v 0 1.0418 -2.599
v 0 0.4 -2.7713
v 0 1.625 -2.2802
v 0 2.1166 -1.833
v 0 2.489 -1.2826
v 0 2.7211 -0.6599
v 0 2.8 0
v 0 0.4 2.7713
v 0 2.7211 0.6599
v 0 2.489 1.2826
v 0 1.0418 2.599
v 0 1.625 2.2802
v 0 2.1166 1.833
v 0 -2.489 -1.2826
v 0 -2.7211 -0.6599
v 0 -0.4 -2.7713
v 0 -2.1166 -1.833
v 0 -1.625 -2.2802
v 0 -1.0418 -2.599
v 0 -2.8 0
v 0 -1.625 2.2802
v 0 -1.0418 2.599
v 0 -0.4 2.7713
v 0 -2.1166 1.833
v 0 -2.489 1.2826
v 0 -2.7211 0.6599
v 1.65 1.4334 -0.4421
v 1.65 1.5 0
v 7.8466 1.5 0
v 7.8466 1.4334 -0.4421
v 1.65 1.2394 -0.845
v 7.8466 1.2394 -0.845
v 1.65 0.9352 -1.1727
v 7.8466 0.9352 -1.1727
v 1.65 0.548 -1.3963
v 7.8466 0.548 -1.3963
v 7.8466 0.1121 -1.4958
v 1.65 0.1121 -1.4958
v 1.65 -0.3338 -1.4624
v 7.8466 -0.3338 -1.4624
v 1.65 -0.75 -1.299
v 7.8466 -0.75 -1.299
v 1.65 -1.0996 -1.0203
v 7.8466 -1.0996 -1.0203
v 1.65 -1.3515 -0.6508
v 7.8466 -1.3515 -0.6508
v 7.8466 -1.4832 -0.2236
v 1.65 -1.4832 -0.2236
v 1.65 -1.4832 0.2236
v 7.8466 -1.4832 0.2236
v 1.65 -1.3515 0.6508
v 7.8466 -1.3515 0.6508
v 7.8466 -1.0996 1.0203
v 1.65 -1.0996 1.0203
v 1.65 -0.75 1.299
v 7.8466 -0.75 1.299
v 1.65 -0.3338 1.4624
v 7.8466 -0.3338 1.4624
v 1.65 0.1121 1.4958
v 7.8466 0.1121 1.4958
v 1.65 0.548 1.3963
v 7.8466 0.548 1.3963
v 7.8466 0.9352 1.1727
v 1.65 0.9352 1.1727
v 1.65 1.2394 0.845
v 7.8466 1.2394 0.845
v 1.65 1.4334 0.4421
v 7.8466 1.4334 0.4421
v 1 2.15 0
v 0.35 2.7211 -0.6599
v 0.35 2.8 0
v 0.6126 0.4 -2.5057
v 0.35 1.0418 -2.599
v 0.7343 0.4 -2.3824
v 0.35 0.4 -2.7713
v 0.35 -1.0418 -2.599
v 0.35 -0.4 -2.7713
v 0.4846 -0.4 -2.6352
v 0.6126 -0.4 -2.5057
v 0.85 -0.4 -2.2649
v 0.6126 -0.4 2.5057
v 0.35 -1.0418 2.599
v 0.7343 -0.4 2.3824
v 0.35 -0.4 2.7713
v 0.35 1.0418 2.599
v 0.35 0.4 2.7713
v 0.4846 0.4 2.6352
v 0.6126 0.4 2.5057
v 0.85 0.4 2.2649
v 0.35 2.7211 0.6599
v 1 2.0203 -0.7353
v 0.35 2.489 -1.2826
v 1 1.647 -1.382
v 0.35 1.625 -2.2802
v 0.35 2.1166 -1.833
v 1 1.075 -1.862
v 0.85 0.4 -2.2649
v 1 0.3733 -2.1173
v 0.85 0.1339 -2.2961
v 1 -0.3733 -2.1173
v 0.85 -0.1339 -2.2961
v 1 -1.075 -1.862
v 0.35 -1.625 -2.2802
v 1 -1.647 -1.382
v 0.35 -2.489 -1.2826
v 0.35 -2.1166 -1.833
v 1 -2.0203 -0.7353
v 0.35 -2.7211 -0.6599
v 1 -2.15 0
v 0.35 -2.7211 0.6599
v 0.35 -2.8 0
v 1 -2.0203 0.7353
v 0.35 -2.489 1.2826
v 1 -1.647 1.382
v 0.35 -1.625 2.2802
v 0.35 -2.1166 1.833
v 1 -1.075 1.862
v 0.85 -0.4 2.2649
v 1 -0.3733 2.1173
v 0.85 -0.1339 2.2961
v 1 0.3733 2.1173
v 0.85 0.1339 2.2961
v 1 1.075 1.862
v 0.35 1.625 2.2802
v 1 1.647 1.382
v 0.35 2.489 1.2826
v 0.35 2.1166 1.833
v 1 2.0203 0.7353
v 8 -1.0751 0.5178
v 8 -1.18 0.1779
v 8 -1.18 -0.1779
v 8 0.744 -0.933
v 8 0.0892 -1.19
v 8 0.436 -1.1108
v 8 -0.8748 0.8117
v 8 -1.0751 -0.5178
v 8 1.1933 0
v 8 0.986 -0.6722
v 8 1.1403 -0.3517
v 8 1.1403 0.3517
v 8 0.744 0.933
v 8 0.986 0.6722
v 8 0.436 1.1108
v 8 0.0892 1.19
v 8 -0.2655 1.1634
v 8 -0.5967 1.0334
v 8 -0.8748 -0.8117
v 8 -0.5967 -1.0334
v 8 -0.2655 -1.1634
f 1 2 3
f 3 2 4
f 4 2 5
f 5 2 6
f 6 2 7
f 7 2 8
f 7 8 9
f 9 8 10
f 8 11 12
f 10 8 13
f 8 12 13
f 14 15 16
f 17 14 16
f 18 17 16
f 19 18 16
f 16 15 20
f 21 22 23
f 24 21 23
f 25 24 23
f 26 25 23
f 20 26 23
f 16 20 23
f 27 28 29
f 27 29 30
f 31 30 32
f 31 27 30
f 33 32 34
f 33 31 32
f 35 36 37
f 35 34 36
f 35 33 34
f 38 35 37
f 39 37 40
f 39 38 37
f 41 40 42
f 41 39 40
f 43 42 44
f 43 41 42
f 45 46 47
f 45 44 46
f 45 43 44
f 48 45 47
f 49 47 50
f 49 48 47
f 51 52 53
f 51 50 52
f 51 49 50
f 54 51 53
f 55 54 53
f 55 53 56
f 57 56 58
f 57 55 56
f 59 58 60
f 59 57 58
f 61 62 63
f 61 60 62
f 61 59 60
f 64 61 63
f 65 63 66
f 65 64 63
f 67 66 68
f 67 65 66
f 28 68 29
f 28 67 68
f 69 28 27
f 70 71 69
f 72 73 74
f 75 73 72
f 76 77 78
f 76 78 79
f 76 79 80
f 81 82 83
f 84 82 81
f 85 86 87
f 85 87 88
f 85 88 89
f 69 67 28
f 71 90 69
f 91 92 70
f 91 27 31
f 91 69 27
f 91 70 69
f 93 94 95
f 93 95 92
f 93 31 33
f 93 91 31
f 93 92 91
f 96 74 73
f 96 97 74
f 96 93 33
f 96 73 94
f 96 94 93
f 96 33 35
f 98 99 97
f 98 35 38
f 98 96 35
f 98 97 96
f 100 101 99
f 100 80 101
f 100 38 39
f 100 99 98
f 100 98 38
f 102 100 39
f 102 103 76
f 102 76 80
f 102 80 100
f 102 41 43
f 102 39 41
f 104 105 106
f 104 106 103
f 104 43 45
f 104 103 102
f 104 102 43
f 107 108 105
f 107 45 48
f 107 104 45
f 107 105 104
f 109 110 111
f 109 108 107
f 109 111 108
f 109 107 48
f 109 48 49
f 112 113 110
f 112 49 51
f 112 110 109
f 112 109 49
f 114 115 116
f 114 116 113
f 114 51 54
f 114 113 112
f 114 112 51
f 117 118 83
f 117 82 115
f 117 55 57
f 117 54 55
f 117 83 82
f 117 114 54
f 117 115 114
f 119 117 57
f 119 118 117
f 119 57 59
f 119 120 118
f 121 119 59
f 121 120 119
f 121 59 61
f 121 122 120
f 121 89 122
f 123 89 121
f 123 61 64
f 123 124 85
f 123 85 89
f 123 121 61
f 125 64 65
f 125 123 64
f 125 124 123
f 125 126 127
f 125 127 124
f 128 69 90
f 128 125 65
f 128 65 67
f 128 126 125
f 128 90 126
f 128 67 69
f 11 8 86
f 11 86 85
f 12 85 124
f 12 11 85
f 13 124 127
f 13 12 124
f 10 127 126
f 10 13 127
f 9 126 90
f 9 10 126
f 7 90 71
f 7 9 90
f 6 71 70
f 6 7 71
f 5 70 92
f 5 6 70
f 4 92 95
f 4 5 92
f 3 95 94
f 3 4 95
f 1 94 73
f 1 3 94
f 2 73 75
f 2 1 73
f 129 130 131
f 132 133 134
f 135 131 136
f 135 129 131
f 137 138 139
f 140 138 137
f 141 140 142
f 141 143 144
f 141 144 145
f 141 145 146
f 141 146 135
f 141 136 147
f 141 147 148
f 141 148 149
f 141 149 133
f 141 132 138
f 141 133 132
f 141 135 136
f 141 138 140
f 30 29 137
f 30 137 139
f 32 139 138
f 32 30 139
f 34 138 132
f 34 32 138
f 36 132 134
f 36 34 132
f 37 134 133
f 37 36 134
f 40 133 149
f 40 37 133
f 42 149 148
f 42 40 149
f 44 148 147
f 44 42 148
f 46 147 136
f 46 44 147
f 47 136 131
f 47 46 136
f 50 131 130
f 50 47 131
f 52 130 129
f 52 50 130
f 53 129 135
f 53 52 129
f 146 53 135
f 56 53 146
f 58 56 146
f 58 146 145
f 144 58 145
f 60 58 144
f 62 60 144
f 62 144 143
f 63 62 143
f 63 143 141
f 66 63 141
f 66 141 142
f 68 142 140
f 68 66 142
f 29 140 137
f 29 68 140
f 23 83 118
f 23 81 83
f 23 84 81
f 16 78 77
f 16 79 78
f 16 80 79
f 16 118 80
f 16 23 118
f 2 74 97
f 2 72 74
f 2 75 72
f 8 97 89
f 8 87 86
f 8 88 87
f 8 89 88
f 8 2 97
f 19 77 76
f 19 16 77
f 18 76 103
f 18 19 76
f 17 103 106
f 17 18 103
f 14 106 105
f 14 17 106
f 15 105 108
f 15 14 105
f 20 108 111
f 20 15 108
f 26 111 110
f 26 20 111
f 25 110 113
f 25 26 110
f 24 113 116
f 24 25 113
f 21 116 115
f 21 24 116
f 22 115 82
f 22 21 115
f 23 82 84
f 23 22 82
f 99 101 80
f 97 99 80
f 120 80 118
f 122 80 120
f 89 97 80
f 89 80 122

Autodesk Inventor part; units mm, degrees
ref_plane "YZ Plane" through (0, 0, 0) normal (1, 0, 0) x (0, 1, 0)
ref_plane "XZ Plane" through (0, 0, 0) normal (0, 1, 0) x (-1, 0, 0)
sketch "Esquisse1" plane through (0, 0, 0) normal (0, 0, 1) x (1, 0, 0)
  line L0 (0, 0) -> (8, 0)
  line L1 (8, 0) -> (8, 1.5)
  line L2 (8, 1.5) -> (2.65, 1.5)
  line L3 (2.65, 1.5) -> (2.3433, 1.5)
  line L4 (2.3433, 1.5) -> (1.65, 1.5)
  line L5 (1.65, 1.5) -> (0.35, 2.8)
  line L6 (0.35, 2.8) -> (0, 2.8)
  line L7 (0, 2.8) -> (0, 0)
  line L8 (2.65, 1.5) -> (1.65, 1.5) construction
  line L9 (-1.6, 0) -> (9.6, 0) projected
  line L10 (0, 3.36) -> (0, -0.56) projected
  dimension "d0" = 8
  dimension "d1" = 45
  dimension "d2" = 0.3067
  dimension "d3" = 5.35
  dimension "d4" = 1.65
  dimension "d5" = 3
  dimension "d6" = 3
  dimension "d7" = 5.6
revolve "Corps" add sketch "Esquisse1" angle 360 about axis through (0, 0, 0) along (1, 0, 0)
sketch "Esquisse2" plane through (0, 0, 0) normal (-1, 0, 0) x (0, 0, 1)
  line L0 (2.8, -0.4) -> (-2.8, -0.4)
  line L1 (-2.8, -0.4) -> (-2.8, 0.4)
  line L2 (-2.8, 0.4) -> (2.8, 0.4)
  line L3 (2.8, 0.4) -> (2.8, -0.4)
  line L4 (0, 0.4) -> (0, -0.4) construction
  line L5 (-2.8, 0) -> (2.8, 0) construction
  line L6 (0, 2.8) -> (0, 0) projected
  dimension "d15" = 0.8
  dimension "d16" = 5.6
extrude "Rainure" cut sketch "Esquisse2" against normal blind 0.85
thread "Filetage" size "M3x0.5" class "6g" standard "ISO Metric profile" length 5.35
chamfer "Chanfrein1" distance 0.3067 distance2 0.1534 1 edges at (8, -1.5, 0) measured on face at (8, 0.263, 0.1197)
ref_plane "Work Plane1" through (33.575, 0, 0) normal (0, 0, -1) x (1, 0, 0)
equation "\"d0\" = NLG"
equation "\"d1\" = 0.5 * SEWI"
equation "\"d2\" = GAL"
equation "\"d3\" = GEL"
equation "\"d4\" = KOH"
equation "\"d5\" = BDM"
equation "\"d6\" = GD"
equation "\"d7\" = KOD"
equation "\"d15\" = SBR"
equation "\"d16\" = KOD"
equation "\"d8\" = STI"
equation "\"d10\" = GEL"
equation "\"d12\" = -0.5 * SPD + 0.5 * GD"
equation "\"d13\" = 0.5 * GAL"
equation "\"NLG\" = 8"
equation "\"GAL\" = 0.61345 * PTC"
equation "\"GEL\" = 5.35"
equation "\"KOH\" = 1.65"
equation "\"KOD\" = 5.6"
equation "\"SEWI\" = 90deg"
equation "\"BDM\" = NND"
equation "\"GD\" = NND"
equation "\"SBR\" = 0.8"
equation "\"STI\" = 0.85"
equation "\"SPD\" = NND - 1.2269 * PTC"
equation "\"GUL\" = 0.61345 * PTC"
equation "\"PTC\" = 0.5"
equation "\"EPV\" = 3.15"
equation "\"THREADDIA\" = 3"
equation "\"TOA\" = 30deg"
equation "\"NND\" = 3"
equation "\"GD1\" = THREADDIA - 1.2269 * PTC"
properties part number "DIN 963 - M3 x 8" material "Acier, doux"
